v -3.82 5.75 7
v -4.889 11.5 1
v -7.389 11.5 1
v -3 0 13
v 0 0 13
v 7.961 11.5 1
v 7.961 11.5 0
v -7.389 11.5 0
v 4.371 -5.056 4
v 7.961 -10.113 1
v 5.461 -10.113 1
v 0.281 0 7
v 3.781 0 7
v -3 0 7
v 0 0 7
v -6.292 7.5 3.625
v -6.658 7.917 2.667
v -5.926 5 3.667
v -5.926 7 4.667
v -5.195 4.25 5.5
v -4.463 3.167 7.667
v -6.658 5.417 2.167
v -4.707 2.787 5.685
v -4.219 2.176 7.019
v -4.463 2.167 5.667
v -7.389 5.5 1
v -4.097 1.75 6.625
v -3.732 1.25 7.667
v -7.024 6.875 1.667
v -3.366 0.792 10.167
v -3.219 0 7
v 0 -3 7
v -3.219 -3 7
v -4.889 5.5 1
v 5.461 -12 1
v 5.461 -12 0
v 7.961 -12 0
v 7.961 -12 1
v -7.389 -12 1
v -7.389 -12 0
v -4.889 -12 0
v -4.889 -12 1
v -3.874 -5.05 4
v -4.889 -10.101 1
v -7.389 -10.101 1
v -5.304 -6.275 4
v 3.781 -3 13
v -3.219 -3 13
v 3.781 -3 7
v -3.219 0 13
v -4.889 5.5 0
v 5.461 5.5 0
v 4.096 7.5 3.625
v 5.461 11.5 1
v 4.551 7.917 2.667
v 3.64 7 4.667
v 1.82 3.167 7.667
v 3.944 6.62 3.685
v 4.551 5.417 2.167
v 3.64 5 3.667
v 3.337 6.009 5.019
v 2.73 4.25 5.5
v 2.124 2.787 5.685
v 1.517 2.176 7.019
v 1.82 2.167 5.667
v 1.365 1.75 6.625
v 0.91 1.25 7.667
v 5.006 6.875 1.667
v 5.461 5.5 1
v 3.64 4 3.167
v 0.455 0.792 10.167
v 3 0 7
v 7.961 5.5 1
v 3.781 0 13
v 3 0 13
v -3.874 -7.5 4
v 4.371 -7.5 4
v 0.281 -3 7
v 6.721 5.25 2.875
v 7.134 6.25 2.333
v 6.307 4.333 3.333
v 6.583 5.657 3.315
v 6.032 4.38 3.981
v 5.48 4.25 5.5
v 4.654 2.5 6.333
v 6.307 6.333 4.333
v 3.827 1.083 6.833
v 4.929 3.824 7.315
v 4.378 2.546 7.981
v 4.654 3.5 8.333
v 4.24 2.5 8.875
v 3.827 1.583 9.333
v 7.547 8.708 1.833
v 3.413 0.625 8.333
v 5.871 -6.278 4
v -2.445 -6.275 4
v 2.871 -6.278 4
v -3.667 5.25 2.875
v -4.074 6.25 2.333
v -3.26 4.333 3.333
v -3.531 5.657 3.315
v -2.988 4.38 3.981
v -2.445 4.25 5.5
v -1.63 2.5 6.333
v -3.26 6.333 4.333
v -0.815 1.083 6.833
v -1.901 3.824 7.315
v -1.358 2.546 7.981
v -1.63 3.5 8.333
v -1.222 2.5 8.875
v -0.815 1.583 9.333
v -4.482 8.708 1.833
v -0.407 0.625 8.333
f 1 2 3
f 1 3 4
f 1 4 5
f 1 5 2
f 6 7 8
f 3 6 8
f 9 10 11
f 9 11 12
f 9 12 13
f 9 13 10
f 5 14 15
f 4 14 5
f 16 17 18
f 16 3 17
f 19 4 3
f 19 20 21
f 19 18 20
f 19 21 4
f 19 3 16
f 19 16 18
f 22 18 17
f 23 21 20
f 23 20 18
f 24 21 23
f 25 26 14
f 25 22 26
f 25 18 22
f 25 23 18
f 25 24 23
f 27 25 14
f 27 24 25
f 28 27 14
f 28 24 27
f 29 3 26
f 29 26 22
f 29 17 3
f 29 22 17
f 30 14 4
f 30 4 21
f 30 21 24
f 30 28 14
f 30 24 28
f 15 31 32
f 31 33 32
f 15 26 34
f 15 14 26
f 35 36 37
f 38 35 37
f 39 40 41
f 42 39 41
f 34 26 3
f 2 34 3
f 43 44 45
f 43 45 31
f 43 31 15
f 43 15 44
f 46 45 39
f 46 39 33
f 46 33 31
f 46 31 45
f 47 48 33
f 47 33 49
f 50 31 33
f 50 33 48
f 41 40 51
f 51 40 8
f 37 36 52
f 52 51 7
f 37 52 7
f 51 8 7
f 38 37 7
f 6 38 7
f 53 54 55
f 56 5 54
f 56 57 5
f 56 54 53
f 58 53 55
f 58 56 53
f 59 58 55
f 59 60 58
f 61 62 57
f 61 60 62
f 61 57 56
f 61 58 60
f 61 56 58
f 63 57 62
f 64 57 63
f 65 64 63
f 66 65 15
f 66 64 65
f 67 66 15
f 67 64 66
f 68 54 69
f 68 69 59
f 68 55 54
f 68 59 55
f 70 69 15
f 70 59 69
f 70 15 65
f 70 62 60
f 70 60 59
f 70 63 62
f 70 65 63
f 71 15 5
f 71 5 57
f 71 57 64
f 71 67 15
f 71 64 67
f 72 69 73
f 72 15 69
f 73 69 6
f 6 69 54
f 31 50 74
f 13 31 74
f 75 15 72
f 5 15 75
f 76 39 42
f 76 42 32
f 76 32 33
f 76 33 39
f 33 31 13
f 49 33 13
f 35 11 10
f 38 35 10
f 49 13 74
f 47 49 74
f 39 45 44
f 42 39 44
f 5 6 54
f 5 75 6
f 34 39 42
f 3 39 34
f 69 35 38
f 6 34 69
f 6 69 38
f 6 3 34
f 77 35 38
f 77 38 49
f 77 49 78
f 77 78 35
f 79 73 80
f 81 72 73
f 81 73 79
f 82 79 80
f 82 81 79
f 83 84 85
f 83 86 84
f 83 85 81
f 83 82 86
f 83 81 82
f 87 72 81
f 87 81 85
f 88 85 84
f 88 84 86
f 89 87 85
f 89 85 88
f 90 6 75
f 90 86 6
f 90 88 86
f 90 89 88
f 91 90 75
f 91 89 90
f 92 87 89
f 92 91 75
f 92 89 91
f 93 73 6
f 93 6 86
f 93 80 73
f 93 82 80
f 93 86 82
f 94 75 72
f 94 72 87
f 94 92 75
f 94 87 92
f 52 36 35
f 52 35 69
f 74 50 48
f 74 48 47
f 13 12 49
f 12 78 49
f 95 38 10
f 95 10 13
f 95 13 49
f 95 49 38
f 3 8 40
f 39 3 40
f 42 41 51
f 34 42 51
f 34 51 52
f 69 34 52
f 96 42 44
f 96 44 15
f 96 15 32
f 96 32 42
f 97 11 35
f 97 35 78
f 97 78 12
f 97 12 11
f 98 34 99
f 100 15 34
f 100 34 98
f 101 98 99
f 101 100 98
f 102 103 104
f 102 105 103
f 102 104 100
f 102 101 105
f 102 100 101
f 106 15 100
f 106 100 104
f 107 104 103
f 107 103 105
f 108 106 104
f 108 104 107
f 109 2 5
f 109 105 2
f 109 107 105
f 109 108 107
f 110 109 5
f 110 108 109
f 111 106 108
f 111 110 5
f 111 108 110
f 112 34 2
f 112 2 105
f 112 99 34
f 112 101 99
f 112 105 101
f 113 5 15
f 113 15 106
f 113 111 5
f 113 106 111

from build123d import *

# Parameters (mm, degrees)
F0_W     = 2.5
F0_H     = 17.5
F1_DEPTH = 1
F2_W     = 7
F2_H     = 6
F3_DEPTH = 3
F4_W     = 2.5
F4_H     = 6
F5_W     = 3
F5_H     = 6
F4_H_2   = 1.899175
F8_W     = 3.219328
F8_H     = 3
F4_H_3   = 1.887217
F8_W_2   = 3.5


with BuildPart() as f1:
    # F0 (on Top) → F1 (new body)
    with BuildSketch(Plane.XY):
        Polygon((7.960672, 11.500003), (-7.389328, 11.500003), (-7.389328, 5.500003), (-4.889328, 5.500003), (5.460672, 5.500003), (7.960672, 5.500003), align=None)
        with Locations((-6.139328, -3.249997)):
            Rectangle(F0_W, F0_H)
        with Locations((6.710672, -3.249997)):
            Rectangle(F0_W, F0_H)
    extrude(amount=F1_DEPTH)


with BuildPart() as f3:
    # F2 (on Front) → F3 (new body)
    with BuildSketch(Plane.XZ):
        with Locations((0.280672, 10)):
            Rectangle(F2_W, F2_H)
    extrude(amount=F3_DEPTH)


with BuildPart() as f6:
    # F4 (on face) → F6 section 0
    with BuildSketch(Plane.XY.offset(1)):
        with Locations((6.710672, 8.500003)):
            Rectangle(F4_W, F4_H)
    # F5 (on Front) → F6 section 1
    with BuildSketch(Plane.XZ):
        with Locations((1.5, 10)):
            Rectangle(F5_W, F5_H)
    loft()


with BuildPart() as f7:
    # F4 (on face) → F7 section 0
    with BuildSketch(Plane.XY.offset(1)):
        with Locations((-6.139328, 8.500003)):
            Rectangle(F4_W, F4_H)
    # F5 (on Front) → F7 section 1
    with BuildSketch(Plane.XZ):
        with Locations((-1.5, 10)):
            Rectangle(F5_W, F5_H)
    loft()


with BuildPart() as f9:
    # F4 (on face) → F9 section 0
    with BuildSketch(Plane.XY.offset(1)):
        with Locations((-6.139328, -11.050409)):
            Rectangle(F4_W, F4_H_2)
    # F8 (on face) → F9 section 1
    with BuildSketch(Plane(origin=(0, 0, 7), x_dir=(1, 0, 0), z_dir=(0, 0, -1))):
        with Locations((-1.609664, 1.5)):
            Rectangle(F8_W, F8_H)
    loft()


with BuildPart() as f10:
    # F4 (on face) → F10 section 0
    with BuildSketch(Plane.XY.offset(1)):
        with Locations((6.710672, -11.056388)):
            Rectangle(F4_W, F4_H_3)
    # F8 (on face) → F10 section 1
    with BuildSketch(Plane(origin=(0, 0, 7), x_dir=(1, 0, 0), z_dir=(0, 0, -1))):
        with Locations((2.030672, 1.5)):
            Rectangle(F8_W_2, F8_H)
    loft()


solid = Compound([f1.part, f3.part, f6.part, f7.part, f9.part, f10.part])
